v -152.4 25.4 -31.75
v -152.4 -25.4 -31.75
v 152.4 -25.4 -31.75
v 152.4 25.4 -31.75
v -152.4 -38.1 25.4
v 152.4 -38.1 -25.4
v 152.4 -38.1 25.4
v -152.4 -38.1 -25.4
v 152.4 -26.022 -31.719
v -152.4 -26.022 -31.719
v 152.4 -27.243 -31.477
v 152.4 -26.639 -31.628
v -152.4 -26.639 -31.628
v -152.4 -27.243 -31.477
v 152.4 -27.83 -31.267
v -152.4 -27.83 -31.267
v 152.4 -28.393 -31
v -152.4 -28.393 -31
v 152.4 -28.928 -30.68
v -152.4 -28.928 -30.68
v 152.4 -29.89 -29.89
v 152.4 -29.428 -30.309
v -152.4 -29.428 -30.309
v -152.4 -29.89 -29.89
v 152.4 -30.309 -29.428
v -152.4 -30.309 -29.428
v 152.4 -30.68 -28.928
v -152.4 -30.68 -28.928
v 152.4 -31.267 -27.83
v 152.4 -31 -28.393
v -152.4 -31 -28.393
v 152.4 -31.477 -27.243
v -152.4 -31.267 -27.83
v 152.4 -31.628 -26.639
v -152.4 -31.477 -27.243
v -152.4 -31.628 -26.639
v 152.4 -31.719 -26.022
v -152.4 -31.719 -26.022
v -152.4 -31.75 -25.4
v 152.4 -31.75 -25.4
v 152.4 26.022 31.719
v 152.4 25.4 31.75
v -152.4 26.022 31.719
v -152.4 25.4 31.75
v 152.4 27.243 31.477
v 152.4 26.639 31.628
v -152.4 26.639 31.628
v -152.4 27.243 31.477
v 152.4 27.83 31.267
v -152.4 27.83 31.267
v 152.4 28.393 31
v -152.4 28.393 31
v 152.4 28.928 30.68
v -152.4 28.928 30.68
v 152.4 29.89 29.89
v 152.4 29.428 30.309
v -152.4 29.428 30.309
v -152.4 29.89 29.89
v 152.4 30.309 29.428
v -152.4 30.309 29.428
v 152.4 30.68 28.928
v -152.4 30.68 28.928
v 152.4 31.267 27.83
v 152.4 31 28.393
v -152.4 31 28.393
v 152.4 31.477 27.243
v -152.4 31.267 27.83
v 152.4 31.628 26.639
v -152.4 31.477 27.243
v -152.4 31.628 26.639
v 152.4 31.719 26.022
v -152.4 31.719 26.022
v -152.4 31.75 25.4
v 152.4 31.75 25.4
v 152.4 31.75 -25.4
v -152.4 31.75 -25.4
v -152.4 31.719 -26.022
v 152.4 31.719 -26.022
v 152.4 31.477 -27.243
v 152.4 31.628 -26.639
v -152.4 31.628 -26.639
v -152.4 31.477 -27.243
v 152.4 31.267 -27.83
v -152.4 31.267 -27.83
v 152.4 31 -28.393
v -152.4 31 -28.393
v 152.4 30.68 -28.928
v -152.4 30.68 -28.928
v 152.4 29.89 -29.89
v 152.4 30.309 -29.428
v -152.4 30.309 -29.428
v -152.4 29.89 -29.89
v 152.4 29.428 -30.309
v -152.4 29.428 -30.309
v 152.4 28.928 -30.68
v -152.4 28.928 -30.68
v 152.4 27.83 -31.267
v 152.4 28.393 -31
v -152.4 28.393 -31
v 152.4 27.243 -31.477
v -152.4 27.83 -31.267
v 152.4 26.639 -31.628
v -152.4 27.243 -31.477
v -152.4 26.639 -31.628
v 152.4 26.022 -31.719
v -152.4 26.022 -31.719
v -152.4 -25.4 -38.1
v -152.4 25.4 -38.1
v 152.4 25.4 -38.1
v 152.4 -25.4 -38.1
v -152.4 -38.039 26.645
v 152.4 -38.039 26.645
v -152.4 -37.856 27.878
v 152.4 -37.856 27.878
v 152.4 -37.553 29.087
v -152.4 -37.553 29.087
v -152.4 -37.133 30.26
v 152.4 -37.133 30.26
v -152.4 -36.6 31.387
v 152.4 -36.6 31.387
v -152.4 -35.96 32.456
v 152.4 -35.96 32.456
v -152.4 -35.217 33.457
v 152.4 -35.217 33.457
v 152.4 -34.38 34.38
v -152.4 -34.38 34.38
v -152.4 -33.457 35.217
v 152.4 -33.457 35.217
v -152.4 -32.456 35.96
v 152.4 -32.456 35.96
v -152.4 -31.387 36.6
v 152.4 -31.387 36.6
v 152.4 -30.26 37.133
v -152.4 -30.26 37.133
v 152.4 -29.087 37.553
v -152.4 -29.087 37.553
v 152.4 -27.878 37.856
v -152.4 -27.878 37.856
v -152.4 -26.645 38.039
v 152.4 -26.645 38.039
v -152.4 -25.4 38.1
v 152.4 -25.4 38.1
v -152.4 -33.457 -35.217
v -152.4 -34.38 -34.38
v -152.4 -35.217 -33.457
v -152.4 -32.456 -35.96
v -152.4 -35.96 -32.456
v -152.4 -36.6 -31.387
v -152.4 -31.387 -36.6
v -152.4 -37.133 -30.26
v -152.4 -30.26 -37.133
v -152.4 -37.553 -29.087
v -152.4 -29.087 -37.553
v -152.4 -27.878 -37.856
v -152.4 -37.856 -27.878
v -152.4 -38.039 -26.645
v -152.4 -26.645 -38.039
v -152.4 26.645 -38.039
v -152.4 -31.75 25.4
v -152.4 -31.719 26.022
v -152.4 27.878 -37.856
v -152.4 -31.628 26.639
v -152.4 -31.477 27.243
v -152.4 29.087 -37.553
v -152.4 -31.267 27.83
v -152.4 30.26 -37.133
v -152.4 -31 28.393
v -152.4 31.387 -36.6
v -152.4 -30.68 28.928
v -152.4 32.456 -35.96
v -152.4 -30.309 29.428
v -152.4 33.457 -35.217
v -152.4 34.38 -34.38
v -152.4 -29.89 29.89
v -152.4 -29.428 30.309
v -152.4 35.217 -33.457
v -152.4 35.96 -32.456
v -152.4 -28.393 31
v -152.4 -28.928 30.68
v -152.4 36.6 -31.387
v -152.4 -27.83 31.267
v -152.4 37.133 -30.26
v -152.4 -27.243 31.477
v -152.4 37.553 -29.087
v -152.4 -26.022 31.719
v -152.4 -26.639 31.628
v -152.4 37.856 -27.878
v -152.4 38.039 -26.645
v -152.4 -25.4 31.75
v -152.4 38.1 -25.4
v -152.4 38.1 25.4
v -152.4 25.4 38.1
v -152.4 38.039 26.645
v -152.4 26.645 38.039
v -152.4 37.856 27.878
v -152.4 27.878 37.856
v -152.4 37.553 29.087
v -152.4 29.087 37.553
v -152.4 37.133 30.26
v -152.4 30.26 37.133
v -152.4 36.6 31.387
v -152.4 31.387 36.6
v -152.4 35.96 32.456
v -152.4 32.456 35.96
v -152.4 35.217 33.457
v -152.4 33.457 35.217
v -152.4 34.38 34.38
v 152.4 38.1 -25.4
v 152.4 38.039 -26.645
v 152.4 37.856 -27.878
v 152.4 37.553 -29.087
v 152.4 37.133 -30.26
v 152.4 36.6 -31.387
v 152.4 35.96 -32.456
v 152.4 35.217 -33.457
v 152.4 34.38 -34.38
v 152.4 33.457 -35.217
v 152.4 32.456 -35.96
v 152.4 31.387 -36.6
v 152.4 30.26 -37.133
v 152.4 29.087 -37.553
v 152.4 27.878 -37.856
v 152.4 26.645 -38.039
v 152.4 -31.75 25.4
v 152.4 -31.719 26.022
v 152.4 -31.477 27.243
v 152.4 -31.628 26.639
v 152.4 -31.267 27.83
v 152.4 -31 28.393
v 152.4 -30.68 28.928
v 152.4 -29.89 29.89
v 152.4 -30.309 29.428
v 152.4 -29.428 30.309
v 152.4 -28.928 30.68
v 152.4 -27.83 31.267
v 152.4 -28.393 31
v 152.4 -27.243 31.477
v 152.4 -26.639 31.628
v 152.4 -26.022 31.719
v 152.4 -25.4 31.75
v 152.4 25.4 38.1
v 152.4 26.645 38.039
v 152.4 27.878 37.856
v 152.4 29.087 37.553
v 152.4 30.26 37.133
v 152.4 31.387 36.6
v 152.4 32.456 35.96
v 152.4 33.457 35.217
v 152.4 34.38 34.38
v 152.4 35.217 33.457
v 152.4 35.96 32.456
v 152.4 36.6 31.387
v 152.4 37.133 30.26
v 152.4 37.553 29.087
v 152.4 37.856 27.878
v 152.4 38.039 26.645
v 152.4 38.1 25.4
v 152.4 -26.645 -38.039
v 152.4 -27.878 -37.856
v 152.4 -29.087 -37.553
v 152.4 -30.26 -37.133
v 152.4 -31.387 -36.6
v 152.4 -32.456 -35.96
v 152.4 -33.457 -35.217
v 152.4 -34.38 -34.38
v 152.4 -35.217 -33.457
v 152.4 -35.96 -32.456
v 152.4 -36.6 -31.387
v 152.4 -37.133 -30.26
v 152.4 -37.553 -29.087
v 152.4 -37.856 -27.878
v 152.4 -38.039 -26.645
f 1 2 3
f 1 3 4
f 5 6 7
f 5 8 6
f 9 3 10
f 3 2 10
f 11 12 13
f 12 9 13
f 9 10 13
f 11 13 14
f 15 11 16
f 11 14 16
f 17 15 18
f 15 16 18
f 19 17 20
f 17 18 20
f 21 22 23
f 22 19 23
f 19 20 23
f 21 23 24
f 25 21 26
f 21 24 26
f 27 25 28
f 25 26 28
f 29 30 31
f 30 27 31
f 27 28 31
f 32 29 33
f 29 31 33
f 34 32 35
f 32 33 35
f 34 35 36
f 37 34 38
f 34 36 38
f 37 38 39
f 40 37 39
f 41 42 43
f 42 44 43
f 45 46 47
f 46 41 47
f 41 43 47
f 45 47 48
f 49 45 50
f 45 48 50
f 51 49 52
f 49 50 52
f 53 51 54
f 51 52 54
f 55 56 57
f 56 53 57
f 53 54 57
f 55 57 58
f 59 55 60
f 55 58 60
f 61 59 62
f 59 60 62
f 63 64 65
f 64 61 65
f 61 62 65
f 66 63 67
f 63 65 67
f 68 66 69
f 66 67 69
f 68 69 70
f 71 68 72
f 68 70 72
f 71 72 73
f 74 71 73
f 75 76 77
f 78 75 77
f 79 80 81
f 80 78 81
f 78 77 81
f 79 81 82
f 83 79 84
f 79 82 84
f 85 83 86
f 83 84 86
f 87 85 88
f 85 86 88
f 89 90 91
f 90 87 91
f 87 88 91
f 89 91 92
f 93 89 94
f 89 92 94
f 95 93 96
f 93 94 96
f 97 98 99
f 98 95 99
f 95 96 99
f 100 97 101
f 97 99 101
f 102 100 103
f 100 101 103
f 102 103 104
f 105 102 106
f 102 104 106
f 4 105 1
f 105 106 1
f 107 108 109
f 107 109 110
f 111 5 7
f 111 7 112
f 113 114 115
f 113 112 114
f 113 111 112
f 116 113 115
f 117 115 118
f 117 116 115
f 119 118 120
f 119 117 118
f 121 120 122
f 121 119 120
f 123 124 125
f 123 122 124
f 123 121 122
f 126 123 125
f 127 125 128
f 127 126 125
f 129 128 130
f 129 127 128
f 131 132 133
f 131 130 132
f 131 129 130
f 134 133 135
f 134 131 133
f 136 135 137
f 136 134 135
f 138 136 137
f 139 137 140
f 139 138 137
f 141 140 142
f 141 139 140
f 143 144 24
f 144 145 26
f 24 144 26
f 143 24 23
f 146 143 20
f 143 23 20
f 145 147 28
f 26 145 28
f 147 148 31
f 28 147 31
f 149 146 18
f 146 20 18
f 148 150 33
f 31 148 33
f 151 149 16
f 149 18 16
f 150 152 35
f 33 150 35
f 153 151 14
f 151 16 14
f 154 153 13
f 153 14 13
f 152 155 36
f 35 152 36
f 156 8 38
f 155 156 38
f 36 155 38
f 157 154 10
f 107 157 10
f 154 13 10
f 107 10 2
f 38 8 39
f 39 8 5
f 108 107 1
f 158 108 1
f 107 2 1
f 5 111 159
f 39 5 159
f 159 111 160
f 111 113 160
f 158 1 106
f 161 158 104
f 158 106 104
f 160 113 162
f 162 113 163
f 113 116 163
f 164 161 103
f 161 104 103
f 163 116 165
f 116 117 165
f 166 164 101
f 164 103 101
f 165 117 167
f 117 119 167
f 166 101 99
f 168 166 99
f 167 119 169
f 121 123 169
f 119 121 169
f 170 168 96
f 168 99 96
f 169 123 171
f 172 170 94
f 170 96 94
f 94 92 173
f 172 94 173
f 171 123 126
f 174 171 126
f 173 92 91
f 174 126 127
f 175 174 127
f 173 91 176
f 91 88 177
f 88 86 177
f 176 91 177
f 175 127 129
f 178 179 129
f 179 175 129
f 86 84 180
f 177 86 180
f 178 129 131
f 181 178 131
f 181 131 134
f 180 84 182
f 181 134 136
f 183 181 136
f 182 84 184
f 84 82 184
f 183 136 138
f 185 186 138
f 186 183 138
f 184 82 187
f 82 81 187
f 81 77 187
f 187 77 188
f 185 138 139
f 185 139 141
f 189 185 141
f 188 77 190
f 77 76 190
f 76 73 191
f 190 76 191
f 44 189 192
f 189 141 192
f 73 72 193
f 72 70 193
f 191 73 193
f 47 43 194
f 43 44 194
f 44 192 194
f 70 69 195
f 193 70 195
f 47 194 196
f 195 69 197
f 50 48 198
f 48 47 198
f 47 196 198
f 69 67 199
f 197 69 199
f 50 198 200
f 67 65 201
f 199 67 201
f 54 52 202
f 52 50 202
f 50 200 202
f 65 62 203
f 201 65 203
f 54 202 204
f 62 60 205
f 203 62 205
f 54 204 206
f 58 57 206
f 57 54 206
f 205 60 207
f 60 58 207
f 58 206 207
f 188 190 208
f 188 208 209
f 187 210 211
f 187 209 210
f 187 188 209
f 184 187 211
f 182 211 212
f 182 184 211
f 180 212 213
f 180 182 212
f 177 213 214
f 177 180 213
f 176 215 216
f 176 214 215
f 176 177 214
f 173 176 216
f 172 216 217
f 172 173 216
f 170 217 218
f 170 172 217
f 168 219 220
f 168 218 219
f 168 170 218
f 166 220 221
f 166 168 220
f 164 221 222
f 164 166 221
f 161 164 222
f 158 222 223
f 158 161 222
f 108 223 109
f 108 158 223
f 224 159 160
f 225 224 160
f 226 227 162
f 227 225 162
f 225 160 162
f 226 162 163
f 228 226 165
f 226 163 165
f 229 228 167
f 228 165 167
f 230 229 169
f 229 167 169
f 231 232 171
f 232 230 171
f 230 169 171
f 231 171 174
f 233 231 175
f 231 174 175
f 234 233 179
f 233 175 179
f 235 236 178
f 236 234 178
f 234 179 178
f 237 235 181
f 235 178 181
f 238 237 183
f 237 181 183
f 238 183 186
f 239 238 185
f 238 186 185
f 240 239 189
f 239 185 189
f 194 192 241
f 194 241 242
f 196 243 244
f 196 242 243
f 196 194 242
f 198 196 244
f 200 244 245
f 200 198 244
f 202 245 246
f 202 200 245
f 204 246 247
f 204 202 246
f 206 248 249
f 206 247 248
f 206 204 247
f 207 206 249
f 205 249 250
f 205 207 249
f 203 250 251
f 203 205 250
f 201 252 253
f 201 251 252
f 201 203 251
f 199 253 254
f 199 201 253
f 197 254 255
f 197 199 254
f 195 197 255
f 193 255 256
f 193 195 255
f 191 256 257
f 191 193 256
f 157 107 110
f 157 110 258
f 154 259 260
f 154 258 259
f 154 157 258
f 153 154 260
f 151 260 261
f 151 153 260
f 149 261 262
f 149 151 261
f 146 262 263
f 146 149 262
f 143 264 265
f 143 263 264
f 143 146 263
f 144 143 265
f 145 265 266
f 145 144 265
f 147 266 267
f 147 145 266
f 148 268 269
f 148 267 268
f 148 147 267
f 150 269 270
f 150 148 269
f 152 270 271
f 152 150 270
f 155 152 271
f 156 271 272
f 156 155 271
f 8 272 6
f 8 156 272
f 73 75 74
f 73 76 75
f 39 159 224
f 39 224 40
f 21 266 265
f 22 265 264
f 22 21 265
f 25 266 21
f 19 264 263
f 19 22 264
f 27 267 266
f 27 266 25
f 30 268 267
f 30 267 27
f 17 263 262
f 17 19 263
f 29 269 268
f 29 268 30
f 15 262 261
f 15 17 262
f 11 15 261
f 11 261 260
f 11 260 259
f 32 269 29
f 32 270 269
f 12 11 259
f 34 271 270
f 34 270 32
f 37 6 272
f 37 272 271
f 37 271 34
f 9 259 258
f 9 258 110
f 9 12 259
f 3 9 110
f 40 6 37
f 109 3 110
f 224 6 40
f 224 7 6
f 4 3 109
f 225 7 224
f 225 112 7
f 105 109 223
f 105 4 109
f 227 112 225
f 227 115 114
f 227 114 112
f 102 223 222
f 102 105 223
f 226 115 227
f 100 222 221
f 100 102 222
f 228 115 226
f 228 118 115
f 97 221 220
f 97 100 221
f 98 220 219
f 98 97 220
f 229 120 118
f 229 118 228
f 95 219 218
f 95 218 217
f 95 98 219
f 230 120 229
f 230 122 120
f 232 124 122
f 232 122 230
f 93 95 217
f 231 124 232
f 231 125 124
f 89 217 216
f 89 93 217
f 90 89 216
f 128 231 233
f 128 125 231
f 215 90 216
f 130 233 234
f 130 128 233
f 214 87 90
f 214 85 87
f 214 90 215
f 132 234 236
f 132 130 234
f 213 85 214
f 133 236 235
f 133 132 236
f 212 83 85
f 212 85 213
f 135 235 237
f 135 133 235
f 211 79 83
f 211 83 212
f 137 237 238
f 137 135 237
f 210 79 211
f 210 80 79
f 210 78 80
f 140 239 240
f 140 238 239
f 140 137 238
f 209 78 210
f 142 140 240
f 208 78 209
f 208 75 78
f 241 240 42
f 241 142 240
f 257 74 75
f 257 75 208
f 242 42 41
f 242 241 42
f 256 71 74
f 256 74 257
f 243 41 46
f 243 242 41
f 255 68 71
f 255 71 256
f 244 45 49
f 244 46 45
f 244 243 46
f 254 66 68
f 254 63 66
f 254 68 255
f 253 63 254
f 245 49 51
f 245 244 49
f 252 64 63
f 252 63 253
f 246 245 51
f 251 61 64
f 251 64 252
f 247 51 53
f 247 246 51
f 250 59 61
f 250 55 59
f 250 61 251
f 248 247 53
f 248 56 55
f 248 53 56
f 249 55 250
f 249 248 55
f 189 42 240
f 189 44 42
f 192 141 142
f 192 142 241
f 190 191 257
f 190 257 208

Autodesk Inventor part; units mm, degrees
ref_plane "YZ Plane" through (0, 0, 0) normal (1, 0, 0) x (0, 1, 0)
ref_plane "XZ Plane" through (0, 0, 0) normal (0, 1, 0) x (-1, 0, 0)
ref_plane "XY Plane" through (0, 0, 0) normal (0, 0, 1) x (1, 0, 0)
sketch "Sketch5" plane through (0, 0, 0) normal (1, 0, 0) x (0, 1, 0)
  line L0 (-25.4, 38.1) -> (25.4, 38.1)
  line L1 (38.1, 25.4) -> (38.1, -25.4)
  line L2 (25.4, -38.1) -> (-25.4, -38.1)
  line L3 (-38.1, -25.4) -> (-38.1, 25.4)
  line L4 (-38.1, 38.1) -> (38.1, -38.1) construction
  line L5 (38.1, 38.1) -> (-38.1, -38.1) construction
  arc A0 (38.1, 25.4) -> (25.4, 38.1) centre (25.4, 25.4) ccw
  arc A1 (25.4, -38.1) -> (38.1, -25.4) centre (25.4, -25.4) ccw
  arc A2 (-38.1, -25.4) -> (-25.4, -38.1) centre (-25.4, -25.4) ccw
  arc A3 (-25.4, 38.1) -> (-38.1, 25.4) centre (-25.4, 25.4) ccw
  line L6 (31.75, -25.4) -> (31.75, 25.4)
  arc A4 (31.75, 25.4) -> (25.4, 31.75) centre (25.4, 25.4) ccw
  line L7 (25.4, 31.75) -> (-25.4, 31.75)
  arc A5 (-25.4, 31.75) -> (-31.75, 25.4) centre (-25.4, 25.4) ccw
  line L8 (-31.75, 25.4) -> (-31.75, -25.4)
  arc A6 (-31.75, -25.4) -> (-25.4, -31.75) centre (-25.4, -25.4) ccw
  line L9 (-25.4, -31.75) -> (25.4, -31.75)
  arc A7 (25.4, -31.75) -> (31.75, -25.4) centre (25.4, -25.4) ccw
  point P0 (0, 0)
  dimension "d6" = 76.2
  dimension "d7" = 76.2
  dimension "d8" = 12.7
  dimension "d9" = 6.35
extrude "Extrusion4" add sketch "Sketch5" along normal mid plane 304.8
properties part number "Front Hitch Model-1_Base Tube-3" material "SS304"
